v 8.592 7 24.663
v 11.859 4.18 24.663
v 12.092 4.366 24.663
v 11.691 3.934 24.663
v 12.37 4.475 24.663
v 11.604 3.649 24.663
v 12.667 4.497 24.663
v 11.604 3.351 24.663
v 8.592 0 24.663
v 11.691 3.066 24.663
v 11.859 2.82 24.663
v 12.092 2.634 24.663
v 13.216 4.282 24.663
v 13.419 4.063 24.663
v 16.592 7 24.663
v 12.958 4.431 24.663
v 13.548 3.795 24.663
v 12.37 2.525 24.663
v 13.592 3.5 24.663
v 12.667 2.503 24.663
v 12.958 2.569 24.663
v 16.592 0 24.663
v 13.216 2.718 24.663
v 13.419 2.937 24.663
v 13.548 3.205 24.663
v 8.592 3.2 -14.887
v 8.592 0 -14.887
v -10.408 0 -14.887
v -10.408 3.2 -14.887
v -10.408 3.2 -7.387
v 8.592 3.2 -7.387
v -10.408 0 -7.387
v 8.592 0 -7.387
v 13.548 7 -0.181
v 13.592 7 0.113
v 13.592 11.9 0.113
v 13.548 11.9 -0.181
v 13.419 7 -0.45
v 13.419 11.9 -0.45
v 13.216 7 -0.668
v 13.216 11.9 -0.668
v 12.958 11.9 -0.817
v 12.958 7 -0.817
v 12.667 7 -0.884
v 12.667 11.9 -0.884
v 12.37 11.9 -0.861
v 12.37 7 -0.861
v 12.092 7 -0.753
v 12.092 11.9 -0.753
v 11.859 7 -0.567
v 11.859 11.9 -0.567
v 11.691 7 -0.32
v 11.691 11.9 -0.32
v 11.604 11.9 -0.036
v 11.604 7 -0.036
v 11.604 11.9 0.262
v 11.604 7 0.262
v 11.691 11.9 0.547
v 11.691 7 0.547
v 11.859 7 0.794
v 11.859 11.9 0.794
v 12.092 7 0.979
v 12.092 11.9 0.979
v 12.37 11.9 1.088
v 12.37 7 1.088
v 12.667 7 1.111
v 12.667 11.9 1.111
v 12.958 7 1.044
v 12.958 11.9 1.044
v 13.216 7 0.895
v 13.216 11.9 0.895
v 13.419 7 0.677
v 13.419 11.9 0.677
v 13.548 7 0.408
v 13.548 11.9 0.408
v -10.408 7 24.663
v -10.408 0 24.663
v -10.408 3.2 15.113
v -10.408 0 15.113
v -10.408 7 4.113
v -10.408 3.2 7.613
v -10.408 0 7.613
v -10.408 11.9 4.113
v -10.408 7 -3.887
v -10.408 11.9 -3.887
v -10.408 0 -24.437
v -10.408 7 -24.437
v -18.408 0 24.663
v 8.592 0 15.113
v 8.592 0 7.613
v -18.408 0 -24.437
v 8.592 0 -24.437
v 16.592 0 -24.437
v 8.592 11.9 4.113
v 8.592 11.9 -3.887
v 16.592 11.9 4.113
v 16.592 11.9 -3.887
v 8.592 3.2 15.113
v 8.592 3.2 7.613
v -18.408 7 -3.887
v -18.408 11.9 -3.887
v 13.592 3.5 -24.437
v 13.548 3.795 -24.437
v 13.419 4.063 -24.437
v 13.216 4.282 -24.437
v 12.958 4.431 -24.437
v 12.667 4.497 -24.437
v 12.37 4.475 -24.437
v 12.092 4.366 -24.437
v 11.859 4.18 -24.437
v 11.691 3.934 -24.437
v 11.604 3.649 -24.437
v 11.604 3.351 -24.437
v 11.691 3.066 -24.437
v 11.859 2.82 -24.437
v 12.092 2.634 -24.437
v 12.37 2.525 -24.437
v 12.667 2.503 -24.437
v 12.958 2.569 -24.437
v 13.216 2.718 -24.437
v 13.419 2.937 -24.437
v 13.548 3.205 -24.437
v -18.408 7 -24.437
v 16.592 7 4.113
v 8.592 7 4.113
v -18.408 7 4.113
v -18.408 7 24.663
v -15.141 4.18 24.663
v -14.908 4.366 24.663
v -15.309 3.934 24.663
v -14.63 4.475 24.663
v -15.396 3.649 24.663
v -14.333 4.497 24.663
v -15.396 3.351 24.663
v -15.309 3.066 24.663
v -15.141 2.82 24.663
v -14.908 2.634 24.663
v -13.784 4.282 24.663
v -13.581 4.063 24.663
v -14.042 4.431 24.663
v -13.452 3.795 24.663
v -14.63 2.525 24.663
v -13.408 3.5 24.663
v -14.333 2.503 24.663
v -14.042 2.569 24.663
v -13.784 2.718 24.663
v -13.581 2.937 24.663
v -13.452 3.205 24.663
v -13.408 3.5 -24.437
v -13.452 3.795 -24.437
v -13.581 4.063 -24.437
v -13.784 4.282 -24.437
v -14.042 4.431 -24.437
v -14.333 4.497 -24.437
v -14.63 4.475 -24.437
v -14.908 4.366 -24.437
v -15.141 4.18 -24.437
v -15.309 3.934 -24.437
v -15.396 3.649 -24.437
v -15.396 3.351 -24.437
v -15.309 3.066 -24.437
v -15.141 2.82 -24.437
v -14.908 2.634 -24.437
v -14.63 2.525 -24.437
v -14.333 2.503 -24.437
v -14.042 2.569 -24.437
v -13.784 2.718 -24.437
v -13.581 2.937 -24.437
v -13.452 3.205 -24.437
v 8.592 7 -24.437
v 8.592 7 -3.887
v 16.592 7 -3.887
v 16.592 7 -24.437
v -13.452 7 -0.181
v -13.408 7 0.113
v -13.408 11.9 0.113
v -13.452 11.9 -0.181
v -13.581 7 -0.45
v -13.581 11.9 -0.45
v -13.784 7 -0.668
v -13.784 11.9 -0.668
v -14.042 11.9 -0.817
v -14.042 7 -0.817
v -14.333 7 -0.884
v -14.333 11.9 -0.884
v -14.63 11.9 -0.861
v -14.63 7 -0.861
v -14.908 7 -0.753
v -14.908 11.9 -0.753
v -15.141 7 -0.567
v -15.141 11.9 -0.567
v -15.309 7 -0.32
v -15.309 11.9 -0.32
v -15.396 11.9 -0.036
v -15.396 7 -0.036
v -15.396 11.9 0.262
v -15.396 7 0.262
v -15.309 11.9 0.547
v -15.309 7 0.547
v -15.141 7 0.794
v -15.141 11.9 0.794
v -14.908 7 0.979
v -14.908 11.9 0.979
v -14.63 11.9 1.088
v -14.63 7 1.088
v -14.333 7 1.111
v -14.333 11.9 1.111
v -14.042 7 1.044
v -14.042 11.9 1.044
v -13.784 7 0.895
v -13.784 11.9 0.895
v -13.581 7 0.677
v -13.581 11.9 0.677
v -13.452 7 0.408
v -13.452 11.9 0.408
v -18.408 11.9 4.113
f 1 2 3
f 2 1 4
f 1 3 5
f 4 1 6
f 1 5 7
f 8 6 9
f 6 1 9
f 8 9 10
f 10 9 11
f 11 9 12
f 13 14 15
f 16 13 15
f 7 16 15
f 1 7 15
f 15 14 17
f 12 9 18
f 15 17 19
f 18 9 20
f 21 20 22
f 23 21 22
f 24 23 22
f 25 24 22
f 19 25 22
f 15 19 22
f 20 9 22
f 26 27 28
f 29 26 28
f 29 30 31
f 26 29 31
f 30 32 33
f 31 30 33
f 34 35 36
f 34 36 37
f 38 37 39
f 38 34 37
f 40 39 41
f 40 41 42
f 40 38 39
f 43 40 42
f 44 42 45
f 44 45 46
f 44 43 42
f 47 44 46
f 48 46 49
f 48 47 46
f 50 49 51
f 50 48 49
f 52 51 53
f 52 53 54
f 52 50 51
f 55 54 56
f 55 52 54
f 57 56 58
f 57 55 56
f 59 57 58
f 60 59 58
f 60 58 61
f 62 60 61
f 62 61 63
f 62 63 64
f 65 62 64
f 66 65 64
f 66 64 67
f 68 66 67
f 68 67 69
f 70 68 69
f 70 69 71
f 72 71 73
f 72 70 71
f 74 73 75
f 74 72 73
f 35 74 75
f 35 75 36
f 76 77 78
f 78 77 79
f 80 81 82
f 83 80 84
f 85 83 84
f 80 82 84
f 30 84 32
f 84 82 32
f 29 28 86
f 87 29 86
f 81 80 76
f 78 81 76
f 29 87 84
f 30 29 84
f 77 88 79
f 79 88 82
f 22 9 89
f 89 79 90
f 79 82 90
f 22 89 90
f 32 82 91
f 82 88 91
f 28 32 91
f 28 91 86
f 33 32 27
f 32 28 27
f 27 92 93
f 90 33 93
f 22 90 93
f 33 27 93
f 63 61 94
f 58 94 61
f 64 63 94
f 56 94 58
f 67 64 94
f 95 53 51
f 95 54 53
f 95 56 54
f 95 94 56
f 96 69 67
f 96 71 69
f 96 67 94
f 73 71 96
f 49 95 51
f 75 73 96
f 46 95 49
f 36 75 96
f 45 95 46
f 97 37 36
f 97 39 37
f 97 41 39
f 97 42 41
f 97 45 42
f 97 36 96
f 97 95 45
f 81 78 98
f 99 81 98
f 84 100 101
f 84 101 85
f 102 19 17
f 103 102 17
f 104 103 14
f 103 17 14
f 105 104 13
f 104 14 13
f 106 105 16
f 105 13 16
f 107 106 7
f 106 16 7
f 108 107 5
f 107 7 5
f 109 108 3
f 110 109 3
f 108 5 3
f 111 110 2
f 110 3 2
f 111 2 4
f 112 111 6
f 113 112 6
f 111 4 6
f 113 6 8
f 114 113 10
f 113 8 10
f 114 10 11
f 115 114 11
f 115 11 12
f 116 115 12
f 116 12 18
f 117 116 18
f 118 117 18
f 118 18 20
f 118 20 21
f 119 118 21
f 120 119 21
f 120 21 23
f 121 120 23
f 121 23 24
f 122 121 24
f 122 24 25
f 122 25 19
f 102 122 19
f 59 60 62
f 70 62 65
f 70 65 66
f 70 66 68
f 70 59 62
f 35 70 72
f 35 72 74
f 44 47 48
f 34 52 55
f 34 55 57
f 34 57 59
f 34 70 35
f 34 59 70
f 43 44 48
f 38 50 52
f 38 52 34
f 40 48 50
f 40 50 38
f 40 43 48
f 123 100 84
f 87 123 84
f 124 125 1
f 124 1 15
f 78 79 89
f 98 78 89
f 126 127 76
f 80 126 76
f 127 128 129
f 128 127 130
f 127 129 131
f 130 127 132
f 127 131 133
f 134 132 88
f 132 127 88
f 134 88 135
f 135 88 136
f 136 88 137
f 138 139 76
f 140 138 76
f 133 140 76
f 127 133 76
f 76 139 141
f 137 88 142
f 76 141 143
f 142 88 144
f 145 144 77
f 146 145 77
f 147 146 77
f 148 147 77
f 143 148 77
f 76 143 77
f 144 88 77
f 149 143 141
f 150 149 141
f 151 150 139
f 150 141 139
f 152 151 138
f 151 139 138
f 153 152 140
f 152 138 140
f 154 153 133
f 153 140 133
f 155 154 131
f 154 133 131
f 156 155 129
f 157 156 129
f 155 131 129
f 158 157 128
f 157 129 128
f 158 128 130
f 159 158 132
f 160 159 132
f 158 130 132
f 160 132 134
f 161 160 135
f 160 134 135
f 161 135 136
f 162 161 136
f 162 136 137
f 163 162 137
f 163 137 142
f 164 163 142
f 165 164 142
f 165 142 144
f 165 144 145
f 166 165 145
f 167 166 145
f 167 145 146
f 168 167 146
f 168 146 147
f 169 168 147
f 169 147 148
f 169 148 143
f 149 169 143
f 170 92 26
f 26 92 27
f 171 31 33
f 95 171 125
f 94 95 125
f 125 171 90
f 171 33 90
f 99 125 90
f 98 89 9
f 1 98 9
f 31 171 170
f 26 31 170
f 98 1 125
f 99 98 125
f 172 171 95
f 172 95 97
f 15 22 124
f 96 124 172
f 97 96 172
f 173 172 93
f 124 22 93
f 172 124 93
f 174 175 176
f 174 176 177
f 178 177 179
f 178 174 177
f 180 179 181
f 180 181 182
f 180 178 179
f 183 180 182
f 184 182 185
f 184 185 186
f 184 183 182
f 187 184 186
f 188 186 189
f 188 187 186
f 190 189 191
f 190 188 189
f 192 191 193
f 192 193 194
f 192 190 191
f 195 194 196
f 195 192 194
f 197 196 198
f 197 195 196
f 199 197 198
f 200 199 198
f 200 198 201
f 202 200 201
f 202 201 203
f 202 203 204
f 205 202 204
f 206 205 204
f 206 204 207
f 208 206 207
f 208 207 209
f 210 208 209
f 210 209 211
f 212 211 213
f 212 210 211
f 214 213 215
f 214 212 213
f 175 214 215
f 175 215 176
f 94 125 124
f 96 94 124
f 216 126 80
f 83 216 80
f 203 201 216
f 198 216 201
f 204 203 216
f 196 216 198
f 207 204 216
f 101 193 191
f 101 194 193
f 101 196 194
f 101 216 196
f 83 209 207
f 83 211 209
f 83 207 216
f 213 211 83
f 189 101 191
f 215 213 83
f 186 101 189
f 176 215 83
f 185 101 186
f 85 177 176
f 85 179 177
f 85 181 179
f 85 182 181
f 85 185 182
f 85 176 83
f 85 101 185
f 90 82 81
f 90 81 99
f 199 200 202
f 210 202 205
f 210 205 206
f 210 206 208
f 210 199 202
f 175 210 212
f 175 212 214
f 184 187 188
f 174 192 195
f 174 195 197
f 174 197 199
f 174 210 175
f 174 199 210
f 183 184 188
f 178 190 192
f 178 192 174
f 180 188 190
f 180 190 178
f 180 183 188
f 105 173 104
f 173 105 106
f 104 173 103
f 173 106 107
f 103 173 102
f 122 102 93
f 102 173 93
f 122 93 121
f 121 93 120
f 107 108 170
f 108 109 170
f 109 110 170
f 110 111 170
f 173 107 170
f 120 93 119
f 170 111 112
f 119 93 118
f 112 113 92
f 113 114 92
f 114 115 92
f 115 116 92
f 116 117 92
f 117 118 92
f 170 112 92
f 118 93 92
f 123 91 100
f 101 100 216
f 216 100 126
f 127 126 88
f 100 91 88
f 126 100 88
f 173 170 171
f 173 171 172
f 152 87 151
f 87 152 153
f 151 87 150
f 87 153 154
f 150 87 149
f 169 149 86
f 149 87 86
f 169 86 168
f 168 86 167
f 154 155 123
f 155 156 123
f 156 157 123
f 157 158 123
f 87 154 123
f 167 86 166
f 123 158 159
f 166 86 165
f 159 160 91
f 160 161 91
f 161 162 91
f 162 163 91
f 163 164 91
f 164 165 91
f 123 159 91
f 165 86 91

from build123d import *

# Parameters (mm, degrees)
CROQUIS1_W              = 19
CROQUIS1_H              = 15
SALIENTE_EXTRUIR1_DEPTH = 7
CROQUIS2_W              = 8
CROQUIS2_H              = 8
CROQUIS2_R              = 1
SALIENTE_EXTRUIR2_DEPTH = 4.9
CROQUIS3_W              = 19
CROQUIS3_H              = 3.8
CORTAR_EXTRUIR1_DEPTH   = 37.9
CROQUIS4_R              = 1
CORTAR_EXTRUIR2_DEPTH   = 51.9


with BuildPart() as part:
    # Croquis1 → Saliente-Extruir1 (new body)
    with BuildSketch(Plane(origin=(0, 0, 0), x_dir=(1, 0, 0), z_dir=(0, 1, 0))):
        Polygon((16.592354246, -24.663454956), (16.592354246, 24.436543518), (8.592354246, 24.436543518), (8.592354246, 14.886544281), (-10.407645754, 14.886544281), (-10.407645754, 24.436543518), (-18.407645754, 24.436543518), (-18.407645754, -24.663454956), (-10.407645754, -24.663454956), (-10.407645754, -15.113455719), (8.592354246, -15.113455719), (8.592354246, -24.663454956), align=None)
        with Locations((-0.907645754, -0.113455719)):
            Rectangle(CROQUIS1_W, CROQUIS1_H, mode=Mode.SUBTRACT)
    extrude(amount=SALIENTE_EXTRUIR1_DEPTH)

    # Croquis2 → Saliente-Extruir2 (add)
    with BuildSketch(Plane(origin=(0, 7, 0), x_dir=(1, 0, 0), z_dir=(0, 1, 0))):
        with Locations((-14.407645754, -0.113455719)):
            Rectangle(CROQUIS2_W, CROQUIS2_H)
        with Locations((-14.407645754, -0.113455719)):
            Circle(CROQUIS2_R, mode=Mode.SUBTRACT)
        with Locations((12.592354246, -0.113455719)):
            Rectangle(CROQUIS2_W, CROQUIS2_H)
        with Locations((12.592354246, -0.113455719)):
            Circle(CROQUIS2_R, mode=Mode.SUBTRACT)
    extrude(amount=SALIENTE_EXTRUIR2_DEPTH)

    # Croquis3 → Cortar-Extruir1 (cut)
    with BuildSketch(Plane.XY.offset(15.113455719)):
        with Locations((-0.907645754, 5.1)):
            Rectangle(CROQUIS3_W, CROQUIS3_H)
    extrude(amount=-CORTAR_EXTRUIR1_DEPTH, mode=Mode.SUBTRACT)

    # Croquis4 → Cortar-Extruir2 (cut)
    with BuildSketch(Plane.XY.offset(24.663454956)):
        with Locations((12.592354246, 3.5)):
            Circle(CROQUIS4_R)
        with Locations((-14.407645754, 3.5)):
            Circle(CROQUIS4_R)
    extrude(amount=-CORTAR_EXTRUIR2_DEPTH, mode=Mode.SUBTRACT)


solid = part.part
